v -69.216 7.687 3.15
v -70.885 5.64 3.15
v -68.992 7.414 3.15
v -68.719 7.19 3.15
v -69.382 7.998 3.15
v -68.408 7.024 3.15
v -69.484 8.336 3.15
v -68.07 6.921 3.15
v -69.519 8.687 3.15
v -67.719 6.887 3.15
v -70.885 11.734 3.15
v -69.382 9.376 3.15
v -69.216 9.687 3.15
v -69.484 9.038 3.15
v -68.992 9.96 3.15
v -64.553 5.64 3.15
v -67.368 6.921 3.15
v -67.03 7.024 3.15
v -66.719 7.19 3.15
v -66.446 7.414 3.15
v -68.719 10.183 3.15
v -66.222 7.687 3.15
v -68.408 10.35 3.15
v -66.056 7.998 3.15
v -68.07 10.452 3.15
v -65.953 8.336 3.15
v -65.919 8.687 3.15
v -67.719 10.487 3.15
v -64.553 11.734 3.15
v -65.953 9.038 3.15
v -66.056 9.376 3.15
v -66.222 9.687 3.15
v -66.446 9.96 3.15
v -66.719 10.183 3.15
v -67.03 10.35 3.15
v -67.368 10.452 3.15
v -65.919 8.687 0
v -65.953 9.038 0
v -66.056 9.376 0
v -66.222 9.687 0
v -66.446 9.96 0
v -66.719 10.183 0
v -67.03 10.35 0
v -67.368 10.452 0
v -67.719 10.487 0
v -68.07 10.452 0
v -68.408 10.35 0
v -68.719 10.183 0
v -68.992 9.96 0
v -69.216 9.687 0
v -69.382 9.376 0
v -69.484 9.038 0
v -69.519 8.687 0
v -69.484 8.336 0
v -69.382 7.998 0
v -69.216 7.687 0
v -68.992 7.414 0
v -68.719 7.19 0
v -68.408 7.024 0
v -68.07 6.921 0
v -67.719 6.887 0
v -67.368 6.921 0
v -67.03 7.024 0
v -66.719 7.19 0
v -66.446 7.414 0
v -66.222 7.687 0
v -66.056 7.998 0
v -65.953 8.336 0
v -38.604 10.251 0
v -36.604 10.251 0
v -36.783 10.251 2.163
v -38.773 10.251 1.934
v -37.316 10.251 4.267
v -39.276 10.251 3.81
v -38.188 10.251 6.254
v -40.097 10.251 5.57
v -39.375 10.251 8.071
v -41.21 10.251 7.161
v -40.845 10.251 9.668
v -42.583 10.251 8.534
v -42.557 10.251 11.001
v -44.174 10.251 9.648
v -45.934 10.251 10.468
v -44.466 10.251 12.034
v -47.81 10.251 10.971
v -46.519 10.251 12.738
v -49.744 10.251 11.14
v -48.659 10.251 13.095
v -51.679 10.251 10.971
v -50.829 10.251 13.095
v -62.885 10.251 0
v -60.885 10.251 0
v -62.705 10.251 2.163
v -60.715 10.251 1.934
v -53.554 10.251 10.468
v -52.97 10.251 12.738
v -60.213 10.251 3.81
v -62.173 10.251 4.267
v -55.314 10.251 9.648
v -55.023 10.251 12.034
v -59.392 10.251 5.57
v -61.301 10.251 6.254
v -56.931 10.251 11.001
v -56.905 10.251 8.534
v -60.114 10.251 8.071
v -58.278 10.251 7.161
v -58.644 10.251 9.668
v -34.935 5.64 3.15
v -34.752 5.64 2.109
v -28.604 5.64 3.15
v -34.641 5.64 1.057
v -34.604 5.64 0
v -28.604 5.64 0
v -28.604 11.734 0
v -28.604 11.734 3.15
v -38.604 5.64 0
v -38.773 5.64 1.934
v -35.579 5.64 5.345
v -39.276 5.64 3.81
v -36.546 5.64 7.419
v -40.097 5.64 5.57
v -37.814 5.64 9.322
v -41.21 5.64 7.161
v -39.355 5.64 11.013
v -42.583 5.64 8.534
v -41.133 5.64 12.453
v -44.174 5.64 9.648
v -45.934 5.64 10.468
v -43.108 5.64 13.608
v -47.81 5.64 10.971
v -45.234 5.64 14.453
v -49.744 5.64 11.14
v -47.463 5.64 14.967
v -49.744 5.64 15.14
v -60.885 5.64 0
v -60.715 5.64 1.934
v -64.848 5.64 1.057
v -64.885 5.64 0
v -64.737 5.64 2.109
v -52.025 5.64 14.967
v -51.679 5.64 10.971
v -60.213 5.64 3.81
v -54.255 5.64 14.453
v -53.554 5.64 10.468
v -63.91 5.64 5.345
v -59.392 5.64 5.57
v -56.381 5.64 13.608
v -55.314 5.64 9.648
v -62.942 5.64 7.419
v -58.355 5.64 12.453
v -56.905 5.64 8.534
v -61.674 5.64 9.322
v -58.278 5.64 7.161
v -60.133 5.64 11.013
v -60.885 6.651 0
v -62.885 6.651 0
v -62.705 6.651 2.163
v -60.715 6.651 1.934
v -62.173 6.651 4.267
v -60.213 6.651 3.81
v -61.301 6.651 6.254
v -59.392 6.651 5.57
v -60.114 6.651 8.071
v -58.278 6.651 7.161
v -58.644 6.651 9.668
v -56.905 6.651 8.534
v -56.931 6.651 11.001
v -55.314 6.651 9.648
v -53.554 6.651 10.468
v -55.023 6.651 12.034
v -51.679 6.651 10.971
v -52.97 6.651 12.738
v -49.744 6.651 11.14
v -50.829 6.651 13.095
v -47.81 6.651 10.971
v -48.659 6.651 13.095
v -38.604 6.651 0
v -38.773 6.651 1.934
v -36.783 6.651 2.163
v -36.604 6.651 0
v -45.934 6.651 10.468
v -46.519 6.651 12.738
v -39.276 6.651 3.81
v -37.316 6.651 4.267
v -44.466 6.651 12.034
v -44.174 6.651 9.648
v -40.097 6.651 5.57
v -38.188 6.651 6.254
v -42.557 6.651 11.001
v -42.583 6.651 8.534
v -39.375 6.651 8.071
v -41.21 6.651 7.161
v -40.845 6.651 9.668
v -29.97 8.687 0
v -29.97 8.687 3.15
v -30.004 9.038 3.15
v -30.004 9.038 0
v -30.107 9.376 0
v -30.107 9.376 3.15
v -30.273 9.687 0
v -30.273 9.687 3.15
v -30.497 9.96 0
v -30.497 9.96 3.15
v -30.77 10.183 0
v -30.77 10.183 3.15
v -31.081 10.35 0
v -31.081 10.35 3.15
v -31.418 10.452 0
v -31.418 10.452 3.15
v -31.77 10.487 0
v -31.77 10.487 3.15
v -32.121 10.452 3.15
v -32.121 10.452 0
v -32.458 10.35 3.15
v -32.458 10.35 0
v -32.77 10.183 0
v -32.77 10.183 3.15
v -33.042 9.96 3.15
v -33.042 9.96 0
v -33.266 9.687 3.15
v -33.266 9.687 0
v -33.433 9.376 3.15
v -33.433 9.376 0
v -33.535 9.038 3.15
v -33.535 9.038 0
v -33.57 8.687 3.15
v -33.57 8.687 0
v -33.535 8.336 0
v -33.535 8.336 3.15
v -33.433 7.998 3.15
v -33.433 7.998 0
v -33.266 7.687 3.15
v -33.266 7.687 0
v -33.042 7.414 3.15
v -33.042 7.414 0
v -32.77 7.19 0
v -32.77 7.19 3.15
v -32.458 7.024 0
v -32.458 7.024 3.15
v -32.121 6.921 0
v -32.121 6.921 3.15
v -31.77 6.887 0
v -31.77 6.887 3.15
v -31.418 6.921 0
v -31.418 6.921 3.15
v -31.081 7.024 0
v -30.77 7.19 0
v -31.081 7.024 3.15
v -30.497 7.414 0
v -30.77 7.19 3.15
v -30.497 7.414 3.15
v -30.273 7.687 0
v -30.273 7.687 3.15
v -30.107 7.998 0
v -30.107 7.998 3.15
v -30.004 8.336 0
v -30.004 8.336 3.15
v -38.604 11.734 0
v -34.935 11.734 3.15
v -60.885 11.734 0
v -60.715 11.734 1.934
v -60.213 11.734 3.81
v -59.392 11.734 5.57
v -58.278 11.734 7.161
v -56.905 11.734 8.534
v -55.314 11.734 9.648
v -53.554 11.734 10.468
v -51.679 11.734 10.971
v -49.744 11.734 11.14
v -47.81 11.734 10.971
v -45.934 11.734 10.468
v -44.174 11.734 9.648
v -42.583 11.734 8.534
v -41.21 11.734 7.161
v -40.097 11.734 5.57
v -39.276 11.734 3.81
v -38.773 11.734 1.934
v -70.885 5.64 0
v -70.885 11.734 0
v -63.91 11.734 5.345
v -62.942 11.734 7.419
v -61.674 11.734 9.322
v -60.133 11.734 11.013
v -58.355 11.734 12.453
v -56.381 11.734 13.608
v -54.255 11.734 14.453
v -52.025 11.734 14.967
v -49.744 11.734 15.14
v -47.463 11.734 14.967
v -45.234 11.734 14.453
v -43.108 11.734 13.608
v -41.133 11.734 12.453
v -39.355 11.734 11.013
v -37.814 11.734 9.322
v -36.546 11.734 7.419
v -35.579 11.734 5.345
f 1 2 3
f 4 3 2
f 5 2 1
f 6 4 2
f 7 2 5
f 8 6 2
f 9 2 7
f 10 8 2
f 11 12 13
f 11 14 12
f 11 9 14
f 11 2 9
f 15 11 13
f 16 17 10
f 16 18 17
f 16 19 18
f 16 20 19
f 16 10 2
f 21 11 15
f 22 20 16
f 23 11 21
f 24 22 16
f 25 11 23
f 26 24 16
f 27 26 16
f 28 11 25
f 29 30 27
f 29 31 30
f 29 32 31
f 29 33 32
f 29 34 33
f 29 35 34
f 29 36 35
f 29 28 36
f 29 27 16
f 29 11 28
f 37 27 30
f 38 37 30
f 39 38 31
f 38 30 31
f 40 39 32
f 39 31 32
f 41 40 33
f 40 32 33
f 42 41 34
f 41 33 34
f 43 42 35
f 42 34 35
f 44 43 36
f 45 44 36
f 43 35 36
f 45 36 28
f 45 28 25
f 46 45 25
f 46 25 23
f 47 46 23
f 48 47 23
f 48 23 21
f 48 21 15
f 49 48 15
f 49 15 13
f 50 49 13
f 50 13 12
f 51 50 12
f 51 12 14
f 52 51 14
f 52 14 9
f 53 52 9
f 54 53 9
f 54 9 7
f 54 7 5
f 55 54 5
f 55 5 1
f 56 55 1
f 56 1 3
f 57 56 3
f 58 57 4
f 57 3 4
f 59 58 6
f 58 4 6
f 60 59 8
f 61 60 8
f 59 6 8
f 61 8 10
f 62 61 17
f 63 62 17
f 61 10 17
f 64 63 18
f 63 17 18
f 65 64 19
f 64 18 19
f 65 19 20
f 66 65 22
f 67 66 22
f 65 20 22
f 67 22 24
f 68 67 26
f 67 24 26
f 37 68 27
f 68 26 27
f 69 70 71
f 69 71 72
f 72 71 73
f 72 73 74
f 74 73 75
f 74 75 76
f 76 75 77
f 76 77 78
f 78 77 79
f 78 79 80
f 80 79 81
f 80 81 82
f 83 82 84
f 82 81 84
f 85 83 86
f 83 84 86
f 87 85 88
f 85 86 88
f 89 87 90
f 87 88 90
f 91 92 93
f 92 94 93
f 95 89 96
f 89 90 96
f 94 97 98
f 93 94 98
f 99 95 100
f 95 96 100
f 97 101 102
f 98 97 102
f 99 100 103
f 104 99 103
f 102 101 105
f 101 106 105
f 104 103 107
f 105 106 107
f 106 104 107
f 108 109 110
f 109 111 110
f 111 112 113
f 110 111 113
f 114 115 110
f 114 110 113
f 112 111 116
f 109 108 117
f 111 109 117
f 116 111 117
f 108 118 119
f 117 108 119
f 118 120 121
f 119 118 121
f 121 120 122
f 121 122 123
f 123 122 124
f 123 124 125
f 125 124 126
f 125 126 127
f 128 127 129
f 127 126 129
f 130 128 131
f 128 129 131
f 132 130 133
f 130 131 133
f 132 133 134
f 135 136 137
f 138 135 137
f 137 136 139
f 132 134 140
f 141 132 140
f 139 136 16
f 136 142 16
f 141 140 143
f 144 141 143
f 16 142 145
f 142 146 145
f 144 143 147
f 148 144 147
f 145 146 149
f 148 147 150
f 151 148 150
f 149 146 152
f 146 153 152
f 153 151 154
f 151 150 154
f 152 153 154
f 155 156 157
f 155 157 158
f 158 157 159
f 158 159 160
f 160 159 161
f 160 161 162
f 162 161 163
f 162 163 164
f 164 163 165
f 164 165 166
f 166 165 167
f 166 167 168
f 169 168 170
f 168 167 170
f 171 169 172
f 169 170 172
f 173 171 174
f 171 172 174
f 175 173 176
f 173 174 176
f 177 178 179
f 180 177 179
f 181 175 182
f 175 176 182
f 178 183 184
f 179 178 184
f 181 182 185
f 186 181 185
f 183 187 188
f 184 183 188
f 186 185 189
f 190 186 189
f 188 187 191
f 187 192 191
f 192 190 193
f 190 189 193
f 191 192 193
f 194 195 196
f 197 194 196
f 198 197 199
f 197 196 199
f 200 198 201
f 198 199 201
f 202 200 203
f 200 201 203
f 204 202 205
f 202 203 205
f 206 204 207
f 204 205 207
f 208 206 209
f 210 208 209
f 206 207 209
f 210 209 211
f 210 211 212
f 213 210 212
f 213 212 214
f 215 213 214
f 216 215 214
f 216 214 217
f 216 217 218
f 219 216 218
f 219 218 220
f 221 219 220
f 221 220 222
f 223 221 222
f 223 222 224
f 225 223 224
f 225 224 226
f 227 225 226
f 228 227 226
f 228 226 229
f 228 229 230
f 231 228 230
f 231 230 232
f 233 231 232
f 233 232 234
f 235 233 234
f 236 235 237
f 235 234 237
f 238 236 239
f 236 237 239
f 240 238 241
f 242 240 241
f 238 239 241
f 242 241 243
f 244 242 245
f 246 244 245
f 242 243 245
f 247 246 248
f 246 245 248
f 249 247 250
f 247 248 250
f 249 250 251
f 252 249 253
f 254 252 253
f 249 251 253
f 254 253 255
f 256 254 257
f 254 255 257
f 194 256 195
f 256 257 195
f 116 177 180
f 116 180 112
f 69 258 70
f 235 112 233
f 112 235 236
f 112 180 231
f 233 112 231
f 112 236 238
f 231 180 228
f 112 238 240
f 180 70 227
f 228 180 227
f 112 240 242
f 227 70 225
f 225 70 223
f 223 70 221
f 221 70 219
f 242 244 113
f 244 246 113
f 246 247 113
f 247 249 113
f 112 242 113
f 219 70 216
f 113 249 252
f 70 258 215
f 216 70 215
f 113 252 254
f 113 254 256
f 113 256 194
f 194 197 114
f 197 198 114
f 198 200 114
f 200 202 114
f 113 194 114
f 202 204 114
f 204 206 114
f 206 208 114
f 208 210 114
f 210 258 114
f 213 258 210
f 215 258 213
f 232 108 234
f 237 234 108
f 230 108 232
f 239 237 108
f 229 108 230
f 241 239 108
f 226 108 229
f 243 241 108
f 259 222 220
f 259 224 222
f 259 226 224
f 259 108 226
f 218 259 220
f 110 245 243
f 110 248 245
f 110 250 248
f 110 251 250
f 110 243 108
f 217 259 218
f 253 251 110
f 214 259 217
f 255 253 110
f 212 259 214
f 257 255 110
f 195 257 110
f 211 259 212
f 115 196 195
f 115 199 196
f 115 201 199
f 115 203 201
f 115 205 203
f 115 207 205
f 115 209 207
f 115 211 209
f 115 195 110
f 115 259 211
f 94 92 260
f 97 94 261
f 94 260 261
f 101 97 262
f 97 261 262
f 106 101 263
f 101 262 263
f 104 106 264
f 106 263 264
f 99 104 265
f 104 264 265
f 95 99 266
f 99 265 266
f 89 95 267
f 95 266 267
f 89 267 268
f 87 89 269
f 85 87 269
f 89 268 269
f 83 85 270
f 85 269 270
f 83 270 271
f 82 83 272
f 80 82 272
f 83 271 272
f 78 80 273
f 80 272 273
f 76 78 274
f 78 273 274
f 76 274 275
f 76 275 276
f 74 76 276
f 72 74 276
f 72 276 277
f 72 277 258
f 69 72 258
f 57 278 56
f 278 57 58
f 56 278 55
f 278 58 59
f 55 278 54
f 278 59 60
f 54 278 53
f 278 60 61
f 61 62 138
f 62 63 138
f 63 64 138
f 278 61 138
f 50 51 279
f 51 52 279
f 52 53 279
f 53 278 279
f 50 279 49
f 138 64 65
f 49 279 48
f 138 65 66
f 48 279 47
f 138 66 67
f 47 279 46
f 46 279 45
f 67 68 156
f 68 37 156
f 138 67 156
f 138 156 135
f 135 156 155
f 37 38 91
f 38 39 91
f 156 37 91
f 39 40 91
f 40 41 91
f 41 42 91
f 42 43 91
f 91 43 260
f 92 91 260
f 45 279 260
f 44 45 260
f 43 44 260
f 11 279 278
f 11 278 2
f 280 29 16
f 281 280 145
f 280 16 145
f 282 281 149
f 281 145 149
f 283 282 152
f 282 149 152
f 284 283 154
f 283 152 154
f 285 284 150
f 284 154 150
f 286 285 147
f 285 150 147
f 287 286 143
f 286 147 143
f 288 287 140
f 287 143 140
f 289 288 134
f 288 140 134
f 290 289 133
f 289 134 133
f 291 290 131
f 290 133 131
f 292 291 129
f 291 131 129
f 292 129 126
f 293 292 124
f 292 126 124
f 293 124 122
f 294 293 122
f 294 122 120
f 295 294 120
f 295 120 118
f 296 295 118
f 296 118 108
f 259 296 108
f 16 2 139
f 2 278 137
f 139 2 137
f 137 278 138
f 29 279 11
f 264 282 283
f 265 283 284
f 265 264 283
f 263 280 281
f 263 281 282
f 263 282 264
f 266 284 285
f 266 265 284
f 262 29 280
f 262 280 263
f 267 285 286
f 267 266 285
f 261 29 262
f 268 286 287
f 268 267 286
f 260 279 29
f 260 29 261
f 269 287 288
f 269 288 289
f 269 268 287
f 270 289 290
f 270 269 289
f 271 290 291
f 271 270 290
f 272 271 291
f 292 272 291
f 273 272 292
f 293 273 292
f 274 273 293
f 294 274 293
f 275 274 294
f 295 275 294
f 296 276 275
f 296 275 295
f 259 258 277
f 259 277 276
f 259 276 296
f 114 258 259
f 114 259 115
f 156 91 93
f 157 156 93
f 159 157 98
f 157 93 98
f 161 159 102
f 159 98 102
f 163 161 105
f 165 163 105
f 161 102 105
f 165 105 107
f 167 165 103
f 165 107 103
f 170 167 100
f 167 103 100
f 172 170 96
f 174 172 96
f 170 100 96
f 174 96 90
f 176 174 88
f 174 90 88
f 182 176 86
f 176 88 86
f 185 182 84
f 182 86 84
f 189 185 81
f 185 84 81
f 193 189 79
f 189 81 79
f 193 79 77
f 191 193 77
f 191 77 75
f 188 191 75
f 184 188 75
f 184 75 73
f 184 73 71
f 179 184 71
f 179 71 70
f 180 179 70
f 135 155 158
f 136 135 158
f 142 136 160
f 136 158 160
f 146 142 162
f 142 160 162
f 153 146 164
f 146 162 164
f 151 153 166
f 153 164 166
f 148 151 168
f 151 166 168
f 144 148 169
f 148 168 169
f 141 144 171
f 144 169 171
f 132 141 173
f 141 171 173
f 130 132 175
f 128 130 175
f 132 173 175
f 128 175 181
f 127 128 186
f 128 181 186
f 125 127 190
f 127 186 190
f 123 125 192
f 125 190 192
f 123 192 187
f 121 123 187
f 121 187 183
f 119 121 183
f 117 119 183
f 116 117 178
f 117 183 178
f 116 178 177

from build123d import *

# Parameters (mm, degrees)
BOSS_EXTRUDE1_DEPTH     = 5
BOSS_EXTRUDE2_DEPTH     = 3
BOSS_EXTRUDE3_DEPTH     = 3
SKETCH10_W              = 9.5
SKETCH10_H              = 5
BOSS_EXTRUDE4_DEPTH     = 15.78
SKETCH11_W              = 9.5
SKETCH11_H              = 2
BOSS_EXTRUDE5_DEPTH     = 40
BOSS_EXTRUDE6_DEPTH     = 6.09393
SKETCH14_R              = 1.8
CUT_EXTRUDE1_DEPTH      = 6.3
SKETCH15_W              = 51.153217575
SKETCH15_H              = 86.05062267
CUT_EXTRUDE3_DEPTH      = 6
CUT_EXTRUDE3_DEPTH_BACK = 19.78
SKETCH16_W              = 9.603970124
SKETCH16_H              = 11.884913028
CUT_EXTRUDE4_DEPTH      = 17.733728816


with BuildPart() as part:
    # Sketch3 → Revolve1 (revolve)
    with BuildSketch(Plane.XY):
        Polygon((-62.694264441, 11.733728816), (-64.884531744, 11.733728816), (-64.884531744, 5.639799249), (-60.884531744, 5.639799249), (-60.884531744, 6.650679103), (-62.884531744, 6.650679103), (-62.884531744, 10.250679103), (-60.884531744, 10.250679103), (-60.884531744, 11.733728816), align=None)
    revolve(axis=Axis((-49.744264441, 0, 0), (0, 1, 0)))

    # Sketch7 → Boss-Extrude1 (add)
    with BuildSketch(Plane(origin=(0, 11.733728816, 0), x_dir=(1, 0, 0), z_dir=(0, 1, 0))):
        with BuildLine():
            Line((-50.244264441, 15.132008921), (-50.244264441, 13.130751112))
            ThreePointArc((-50.244264441, 13.130751112), (-49.744264441, 13.140267302), (-49.244264441, 13.130751112))
            Line((-49.244264441, 13.130751112), (-49.244264441, 15.132008921))
            ThreePointArc((-49.244264441, 15.132008921), (-49.744264441, 15.140267302), (-50.244264441, 15.132008921))
        make_face()
    extrude(amount=BOSS_EXTRUDE1_DEPTH)

    # Sketch8 → Boss-Extrude2 (add)
    with BuildSketch(Plane(origin=(0, 16.733728816, 0), x_dir=(1, 0, 0), z_dir=(0, 1, 0))):
        with BuildLine():
            Line((-50.244264441, 15.132008921), (-50.244264441, 13.130751112))
            Line((-50.244264441, 13.130751112), (-50.244264441, -4.369248888))
            Line((-50.244264441, -4.369248888), (-49.244264441, -4.369248888))
            Line((-49.244264441, -4.369248888), (-49.244264441, 13.130751112))
            Line((-49.244264441, 13.130751112), (-49.244264441, 15.132008921))
            ThreePointArc((-49.244264441, 15.132008921), (-49.744264441, 15.140267302), (-50.244264441, 15.132008921))
        make_face()
    extrude(amount=-BOSS_EXTRUDE2_DEPTH)

    # Sketch9 → Boss-Extrude3 (add)
    with BuildSketch(Plane(origin=(0, 11.733728816, 0), x_dir=(1, 0, 0), z_dir=(0, 1, 0))):
        with BuildLine():
            Line((-54.494264441, 14.375854548), (-54.494264441, 39.375854548))
            Line((-54.494264441, 39.375854548), (-44.994264441, 39.375854548))
            Line((-44.994264441, 39.375854548), (-44.994264441, 14.375854548))
            ThreePointArc((-44.994264441, 14.375854548), (-47.092177082, 14.906177465), (-49.244264441, 15.132008921))
            ThreePointArc((-49.244264441, 15.132008921), (-49.744264441, 15.140267302), (-50.244264441, 15.132008921))
            ThreePointArc((-50.244264441, 15.132008921), (-52.3963518, 14.906177465), (-54.494264441, 14.375854548))
        make_face()
    extrude(amount=-BOSS_EXTRUDE3_DEPTH)

    # Sketch10 → Boss-Extrude4 (add)
    with BuildSketch(Plane.XZ.offset(-8.733728816)):
        with Locations((-49.744264441, -36.875854548)):
            Rectangle(SKETCH10_W, SKETCH10_H)
    extrude(amount=BOSS_EXTRUDE4_DEPTH)

    # Sketch11 → Boss-Extrude5 (add)
    with BuildSketch(Plane(origin=(0, 0, -39.375854548), x_dir=(-1, 0, 0), z_dir=(0, 0, -1))):
        with Locations((49.744264441, -6.046271184)):
            Rectangle(SKETCH11_W, SKETCH11_H)
    extrude(amount=BOSS_EXTRUDE5_DEPTH)

    # Sketch13 → Boss-Extrude6 (add)
    with BuildSketch(Plane(origin=(0, 11.733728816, 0), x_dir=(1, 0, 0), z_dir=(0, 1, 0))):
        with BuildLine():
            Line((-28.603997139, 3.15), (-34.935307895, 3.15))
            ThreePointArc((-34.935307895, 3.15), (-34.603997139, 0), (-34.935307895, -3.15))
            Line((-34.935307895, -3.15), (-28.603997139, -3.15))
            Line((-28.603997139, -3.15), (-28.603997139, 3.15))
        make_face()
        with BuildLine():
            Line((-70.884531744, 3.15), (-70.884531744, -3.15))
            Line((-70.884531744, -3.15), (-64.553220987, -3.15))
            ThreePointArc((-64.553220987, -3.15), (-64.884531744, 0), (-64.553220987, 3.15))
            Line((-64.553220987, 3.15), (-70.884531744, 3.15))
        make_face()
    extrude(amount=-BOSS_EXTRUDE6_DEPTH)

    # Sketch14 → Cut-Extrude1 (cut)
    with BuildSketch(Plane.XY.offset(3.15)):
        with Locations((-31.769652517, 8.686764033)):
            Circle(SKETCH14_R)
        with Locations((-67.718876365, 8.686764033)):
            Circle(SKETCH14_R)
    extrude(amount=-CUT_EXTRUDE1_DEPTH, mode=Mode.SUBTRACT)

    # Sketch15 → Cut-Extrude3 (cut, two sides)
    with BuildSketch(Plane(origin=(0, 11.733728816, 0), x_dir=(1, 0, 0), z_dir=(0, 1, 0))) as cut_extrude3_sk:
        with Locations((-49.018725857, 43.025311335)):
            Rectangle(SKETCH15_W, SKETCH15_H)
    extrude(amount=CUT_EXTRUDE3_DEPTH, mode=Mode.SUBTRACT)
    extrude(cut_extrude3_sk.sketch, amount=-CUT_EXTRUDE3_DEPTH_BACK, mode=Mode.SUBTRACT)

    # Sketch16 → Cut-Extrude4 (cut, through all)
    with BuildSketch(Plane(origin=(0, 0, 0), x_dir=(1, 0, 0), z_dir=(0, 1, 0))):
        with Locations((-50.086315959, -0.525030424)):
            Rectangle(SKETCH16_W, SKETCH16_H)
    extrude(amount=CUT_EXTRUDE4_DEPTH, mode=Mode.SUBTRACT)


solid = part.part
